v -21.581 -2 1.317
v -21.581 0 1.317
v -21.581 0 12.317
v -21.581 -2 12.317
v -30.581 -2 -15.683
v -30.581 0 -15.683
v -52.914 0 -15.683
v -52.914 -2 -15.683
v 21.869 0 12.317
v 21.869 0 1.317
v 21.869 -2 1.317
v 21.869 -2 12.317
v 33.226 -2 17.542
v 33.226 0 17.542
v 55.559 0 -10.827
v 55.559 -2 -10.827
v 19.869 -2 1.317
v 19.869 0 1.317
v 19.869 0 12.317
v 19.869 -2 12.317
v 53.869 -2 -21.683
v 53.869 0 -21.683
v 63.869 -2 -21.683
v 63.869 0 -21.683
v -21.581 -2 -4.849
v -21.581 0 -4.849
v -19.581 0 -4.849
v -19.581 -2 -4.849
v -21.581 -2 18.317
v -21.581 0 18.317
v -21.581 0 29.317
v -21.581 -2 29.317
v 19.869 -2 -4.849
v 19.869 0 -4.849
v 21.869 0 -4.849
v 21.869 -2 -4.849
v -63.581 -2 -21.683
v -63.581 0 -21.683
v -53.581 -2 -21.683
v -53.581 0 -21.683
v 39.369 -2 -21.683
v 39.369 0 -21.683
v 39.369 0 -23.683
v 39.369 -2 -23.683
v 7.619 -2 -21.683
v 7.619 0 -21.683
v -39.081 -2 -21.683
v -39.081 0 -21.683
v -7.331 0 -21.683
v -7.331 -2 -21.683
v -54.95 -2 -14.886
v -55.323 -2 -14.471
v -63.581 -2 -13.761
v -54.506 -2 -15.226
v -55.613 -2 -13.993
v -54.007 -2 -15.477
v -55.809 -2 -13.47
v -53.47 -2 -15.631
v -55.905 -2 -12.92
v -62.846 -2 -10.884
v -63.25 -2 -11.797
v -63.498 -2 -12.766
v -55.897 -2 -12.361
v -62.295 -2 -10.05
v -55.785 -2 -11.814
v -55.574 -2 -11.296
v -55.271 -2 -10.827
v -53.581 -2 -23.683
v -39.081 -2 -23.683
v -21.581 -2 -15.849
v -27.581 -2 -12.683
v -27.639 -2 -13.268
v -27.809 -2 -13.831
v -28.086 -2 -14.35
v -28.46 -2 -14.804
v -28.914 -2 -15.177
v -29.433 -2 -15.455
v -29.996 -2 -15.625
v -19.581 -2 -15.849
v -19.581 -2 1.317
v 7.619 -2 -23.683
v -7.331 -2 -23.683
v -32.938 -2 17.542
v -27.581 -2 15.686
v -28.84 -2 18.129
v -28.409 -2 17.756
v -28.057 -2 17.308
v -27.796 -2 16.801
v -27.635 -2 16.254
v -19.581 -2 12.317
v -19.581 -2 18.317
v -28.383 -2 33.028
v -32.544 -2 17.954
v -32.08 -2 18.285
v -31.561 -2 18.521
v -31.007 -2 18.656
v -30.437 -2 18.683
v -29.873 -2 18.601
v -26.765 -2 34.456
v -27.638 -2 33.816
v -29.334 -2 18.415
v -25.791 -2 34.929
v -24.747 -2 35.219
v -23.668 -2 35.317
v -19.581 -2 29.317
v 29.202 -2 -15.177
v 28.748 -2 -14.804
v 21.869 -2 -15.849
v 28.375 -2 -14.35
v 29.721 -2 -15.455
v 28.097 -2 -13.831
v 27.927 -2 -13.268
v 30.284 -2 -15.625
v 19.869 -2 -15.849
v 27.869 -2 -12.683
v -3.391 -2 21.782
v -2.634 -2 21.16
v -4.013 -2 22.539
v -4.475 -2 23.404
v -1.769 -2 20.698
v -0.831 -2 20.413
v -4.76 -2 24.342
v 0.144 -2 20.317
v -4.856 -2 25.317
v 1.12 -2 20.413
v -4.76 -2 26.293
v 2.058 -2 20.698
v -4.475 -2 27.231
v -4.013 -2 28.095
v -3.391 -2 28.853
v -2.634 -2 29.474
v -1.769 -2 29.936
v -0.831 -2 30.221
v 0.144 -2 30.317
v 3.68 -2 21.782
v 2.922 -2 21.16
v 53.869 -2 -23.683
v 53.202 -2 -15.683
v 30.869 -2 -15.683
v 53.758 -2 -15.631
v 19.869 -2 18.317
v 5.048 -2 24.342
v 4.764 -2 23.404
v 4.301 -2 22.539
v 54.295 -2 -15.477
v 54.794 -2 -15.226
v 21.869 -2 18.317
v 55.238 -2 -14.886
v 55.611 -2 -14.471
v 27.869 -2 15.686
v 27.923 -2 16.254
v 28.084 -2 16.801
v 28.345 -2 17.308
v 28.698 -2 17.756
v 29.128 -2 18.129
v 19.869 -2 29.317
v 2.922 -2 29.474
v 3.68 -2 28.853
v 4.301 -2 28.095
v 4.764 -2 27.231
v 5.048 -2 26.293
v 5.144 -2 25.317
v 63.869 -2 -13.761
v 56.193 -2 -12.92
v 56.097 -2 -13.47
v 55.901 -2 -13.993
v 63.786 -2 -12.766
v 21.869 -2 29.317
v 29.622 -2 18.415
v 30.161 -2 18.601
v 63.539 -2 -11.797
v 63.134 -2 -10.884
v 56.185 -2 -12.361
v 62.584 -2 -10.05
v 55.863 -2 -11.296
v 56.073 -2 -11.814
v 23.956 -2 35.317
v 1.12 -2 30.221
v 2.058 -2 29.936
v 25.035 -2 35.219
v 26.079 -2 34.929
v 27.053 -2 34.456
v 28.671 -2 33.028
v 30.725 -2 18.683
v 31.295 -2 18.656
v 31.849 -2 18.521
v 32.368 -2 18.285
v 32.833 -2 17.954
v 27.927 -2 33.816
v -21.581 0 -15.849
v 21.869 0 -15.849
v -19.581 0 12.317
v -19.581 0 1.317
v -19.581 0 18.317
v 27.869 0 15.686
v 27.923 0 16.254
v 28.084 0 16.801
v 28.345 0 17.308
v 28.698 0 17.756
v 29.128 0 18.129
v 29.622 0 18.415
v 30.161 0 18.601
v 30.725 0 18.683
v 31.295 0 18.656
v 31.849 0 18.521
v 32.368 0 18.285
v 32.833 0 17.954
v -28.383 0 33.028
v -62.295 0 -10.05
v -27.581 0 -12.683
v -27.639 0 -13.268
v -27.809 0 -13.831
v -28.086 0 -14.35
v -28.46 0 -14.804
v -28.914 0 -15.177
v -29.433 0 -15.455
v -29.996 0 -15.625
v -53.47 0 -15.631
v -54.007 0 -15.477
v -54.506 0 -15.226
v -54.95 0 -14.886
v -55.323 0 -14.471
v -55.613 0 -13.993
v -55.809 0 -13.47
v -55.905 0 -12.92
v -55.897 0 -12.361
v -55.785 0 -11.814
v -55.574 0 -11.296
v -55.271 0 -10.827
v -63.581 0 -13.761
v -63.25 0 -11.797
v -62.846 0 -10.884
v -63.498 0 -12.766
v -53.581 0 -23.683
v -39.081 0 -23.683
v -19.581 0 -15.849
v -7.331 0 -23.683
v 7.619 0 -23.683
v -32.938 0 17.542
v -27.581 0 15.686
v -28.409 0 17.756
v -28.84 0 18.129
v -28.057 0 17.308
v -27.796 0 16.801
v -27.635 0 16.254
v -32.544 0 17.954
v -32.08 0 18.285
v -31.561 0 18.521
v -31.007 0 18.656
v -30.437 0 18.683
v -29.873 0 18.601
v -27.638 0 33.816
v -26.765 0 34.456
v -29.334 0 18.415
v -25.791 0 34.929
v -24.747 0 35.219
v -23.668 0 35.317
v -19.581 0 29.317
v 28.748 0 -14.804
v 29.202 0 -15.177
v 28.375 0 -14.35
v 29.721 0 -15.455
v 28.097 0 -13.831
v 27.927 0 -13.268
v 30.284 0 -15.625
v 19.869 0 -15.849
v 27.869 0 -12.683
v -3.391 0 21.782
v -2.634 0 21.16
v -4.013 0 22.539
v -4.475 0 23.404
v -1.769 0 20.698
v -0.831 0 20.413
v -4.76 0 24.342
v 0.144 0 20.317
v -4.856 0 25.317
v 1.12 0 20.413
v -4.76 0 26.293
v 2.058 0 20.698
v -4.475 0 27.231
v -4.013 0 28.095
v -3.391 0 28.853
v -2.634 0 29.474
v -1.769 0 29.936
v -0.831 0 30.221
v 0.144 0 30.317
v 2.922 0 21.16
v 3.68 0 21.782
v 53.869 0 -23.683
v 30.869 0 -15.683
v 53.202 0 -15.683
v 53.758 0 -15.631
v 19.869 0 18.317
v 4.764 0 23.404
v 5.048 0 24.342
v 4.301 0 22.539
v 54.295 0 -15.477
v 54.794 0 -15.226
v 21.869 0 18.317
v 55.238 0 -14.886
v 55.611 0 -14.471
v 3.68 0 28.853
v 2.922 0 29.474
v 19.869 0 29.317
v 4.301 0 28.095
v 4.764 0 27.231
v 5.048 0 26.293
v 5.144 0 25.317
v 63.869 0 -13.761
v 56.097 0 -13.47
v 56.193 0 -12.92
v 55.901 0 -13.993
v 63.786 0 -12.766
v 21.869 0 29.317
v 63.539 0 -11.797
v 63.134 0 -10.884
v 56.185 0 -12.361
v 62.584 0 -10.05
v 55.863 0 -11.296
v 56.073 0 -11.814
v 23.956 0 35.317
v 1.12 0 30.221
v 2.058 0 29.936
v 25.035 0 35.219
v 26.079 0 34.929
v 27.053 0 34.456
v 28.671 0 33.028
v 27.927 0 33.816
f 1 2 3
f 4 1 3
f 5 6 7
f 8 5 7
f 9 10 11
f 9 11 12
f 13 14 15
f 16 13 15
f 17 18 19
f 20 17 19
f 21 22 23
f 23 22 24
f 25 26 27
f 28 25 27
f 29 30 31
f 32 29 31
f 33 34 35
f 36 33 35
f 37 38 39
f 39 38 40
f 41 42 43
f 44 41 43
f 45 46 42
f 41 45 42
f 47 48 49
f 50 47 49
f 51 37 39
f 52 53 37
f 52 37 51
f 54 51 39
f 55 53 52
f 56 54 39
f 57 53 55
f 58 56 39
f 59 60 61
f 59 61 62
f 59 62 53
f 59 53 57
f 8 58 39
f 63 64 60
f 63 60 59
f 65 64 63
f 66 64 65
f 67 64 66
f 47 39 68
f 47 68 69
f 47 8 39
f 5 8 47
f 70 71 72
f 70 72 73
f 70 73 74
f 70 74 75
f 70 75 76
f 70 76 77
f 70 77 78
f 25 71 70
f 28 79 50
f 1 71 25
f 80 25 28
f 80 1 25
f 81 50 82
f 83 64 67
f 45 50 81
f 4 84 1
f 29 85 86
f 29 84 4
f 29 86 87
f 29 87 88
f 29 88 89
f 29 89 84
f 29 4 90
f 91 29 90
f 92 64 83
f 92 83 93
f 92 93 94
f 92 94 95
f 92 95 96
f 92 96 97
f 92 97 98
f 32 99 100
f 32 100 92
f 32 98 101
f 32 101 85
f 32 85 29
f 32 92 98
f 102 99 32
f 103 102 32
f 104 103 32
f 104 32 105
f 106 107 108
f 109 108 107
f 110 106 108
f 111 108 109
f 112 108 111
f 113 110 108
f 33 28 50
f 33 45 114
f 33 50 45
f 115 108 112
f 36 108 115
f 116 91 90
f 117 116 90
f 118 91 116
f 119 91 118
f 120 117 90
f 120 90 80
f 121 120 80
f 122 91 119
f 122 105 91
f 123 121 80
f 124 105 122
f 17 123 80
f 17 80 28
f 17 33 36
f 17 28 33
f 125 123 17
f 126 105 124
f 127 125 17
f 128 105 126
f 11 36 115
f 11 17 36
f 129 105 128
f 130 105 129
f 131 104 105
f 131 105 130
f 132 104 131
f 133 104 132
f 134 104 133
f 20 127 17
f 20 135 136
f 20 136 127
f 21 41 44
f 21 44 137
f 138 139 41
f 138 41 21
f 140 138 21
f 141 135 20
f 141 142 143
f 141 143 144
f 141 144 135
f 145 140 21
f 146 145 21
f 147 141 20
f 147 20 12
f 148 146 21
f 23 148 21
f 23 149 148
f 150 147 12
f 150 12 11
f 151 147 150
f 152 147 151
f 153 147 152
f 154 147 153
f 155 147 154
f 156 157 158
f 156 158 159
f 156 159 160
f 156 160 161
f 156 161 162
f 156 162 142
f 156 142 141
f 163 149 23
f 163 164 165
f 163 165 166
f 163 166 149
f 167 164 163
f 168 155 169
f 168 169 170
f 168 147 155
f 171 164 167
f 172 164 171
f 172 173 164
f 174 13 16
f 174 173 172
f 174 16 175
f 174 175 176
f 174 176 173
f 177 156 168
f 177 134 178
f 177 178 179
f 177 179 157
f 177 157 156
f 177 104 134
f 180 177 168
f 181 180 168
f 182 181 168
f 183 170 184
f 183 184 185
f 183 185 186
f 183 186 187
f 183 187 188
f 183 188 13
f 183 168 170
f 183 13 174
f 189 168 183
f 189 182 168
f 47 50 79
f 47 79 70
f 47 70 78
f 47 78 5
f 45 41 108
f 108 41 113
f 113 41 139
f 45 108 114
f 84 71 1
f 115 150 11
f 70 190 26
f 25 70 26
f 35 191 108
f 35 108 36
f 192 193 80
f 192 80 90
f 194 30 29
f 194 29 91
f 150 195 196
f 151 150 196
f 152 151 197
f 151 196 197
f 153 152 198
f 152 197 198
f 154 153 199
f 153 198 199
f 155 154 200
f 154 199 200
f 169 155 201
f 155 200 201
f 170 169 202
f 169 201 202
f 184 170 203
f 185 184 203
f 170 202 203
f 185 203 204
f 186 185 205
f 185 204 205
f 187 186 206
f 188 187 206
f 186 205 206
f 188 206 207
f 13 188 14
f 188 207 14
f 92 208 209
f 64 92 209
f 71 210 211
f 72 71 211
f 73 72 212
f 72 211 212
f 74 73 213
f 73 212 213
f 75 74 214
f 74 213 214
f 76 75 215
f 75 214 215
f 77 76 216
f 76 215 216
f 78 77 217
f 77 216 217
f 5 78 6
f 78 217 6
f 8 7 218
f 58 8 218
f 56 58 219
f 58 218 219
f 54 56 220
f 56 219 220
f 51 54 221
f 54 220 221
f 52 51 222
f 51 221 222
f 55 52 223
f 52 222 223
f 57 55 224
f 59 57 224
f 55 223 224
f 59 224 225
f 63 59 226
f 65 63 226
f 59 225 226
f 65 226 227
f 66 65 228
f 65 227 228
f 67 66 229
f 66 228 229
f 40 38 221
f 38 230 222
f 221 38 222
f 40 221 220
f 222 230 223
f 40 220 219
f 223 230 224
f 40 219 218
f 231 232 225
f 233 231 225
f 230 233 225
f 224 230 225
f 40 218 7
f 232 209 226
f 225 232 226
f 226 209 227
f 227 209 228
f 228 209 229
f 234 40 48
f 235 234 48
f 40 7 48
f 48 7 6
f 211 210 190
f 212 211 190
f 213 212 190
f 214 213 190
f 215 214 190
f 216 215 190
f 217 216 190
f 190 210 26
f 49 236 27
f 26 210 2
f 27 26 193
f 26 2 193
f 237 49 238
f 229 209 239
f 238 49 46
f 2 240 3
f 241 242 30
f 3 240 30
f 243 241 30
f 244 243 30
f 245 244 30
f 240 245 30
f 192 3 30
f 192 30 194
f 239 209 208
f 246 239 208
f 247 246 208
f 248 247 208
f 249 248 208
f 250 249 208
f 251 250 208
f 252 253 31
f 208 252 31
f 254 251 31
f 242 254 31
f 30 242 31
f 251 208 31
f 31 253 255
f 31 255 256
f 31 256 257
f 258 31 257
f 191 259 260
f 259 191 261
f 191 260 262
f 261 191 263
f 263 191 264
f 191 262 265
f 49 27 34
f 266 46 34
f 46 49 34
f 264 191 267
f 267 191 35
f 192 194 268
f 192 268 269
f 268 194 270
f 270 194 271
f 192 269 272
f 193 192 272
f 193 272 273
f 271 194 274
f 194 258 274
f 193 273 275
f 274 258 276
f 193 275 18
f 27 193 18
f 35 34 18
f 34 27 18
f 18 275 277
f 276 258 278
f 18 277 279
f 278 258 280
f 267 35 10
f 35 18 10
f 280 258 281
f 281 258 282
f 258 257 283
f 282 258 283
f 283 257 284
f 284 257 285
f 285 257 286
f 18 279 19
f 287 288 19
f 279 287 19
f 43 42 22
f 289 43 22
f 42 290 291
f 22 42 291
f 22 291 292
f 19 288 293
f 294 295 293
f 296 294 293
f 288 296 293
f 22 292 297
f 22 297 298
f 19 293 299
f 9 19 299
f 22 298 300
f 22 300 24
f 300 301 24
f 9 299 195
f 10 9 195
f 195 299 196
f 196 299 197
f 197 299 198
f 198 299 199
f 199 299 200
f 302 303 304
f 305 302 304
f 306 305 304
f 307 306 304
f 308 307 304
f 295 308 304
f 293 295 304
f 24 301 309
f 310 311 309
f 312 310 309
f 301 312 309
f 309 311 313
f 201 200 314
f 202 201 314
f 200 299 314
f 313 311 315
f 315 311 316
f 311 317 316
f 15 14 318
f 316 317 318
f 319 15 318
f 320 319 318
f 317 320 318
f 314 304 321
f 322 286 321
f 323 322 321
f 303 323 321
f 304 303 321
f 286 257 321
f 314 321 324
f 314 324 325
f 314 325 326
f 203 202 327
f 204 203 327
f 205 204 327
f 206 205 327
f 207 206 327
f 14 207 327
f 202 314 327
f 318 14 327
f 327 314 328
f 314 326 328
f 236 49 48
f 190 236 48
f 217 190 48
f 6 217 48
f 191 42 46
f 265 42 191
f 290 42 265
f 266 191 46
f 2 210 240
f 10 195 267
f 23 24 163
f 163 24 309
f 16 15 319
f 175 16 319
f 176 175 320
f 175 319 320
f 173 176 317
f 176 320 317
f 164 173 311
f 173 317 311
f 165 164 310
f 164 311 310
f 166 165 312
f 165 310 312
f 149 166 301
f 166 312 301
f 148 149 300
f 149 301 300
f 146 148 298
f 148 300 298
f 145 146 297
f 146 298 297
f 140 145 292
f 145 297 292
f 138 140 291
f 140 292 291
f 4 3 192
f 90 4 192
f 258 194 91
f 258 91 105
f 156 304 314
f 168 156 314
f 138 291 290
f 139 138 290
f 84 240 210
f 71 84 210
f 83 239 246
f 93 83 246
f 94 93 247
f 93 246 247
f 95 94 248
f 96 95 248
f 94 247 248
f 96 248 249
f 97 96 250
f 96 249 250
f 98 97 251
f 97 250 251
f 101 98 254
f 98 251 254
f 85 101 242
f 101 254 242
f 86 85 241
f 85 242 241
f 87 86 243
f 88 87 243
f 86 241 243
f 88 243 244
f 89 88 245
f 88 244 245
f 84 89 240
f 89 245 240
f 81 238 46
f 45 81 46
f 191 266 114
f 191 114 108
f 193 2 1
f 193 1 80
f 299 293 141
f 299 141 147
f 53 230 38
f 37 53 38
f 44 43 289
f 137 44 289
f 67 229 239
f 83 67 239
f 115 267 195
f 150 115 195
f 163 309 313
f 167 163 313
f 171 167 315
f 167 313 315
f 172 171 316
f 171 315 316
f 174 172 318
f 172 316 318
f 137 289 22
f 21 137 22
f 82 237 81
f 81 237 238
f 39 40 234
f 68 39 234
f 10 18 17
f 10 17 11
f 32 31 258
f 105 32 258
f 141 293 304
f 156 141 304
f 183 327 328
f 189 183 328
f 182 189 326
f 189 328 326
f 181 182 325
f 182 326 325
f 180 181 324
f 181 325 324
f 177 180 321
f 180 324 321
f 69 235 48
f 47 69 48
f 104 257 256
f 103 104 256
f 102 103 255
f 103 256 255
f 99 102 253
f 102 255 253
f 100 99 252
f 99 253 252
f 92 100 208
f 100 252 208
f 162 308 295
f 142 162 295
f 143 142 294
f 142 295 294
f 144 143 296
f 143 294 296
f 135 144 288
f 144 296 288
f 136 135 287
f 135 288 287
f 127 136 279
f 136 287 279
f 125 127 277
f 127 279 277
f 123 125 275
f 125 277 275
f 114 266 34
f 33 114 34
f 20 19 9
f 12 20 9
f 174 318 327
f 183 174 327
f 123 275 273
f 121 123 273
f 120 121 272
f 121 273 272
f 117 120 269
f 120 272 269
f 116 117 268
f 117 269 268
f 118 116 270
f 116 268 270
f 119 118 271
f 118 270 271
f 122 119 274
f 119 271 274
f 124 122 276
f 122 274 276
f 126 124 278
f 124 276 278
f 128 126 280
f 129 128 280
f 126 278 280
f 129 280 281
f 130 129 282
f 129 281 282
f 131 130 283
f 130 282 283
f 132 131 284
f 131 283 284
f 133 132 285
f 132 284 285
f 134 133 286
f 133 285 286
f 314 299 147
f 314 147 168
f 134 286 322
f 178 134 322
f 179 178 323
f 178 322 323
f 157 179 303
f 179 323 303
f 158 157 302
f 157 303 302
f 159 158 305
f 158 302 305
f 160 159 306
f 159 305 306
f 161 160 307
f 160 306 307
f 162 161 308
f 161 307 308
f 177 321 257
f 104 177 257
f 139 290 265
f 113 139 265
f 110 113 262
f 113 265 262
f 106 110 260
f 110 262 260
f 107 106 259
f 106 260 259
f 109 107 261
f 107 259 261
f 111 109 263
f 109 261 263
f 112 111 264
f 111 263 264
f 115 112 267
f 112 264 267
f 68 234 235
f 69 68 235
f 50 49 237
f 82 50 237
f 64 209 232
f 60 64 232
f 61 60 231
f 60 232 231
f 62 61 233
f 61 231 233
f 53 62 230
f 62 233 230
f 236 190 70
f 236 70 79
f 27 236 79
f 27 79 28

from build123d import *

# Parameters (mm, degrees)
F0_W     = 2
F0_H     = 11
F1_DEPTH = 2


with BuildPart() as f1:
    # F0 (on Front) → F1 (new body)
    with BuildSketch(Plane.XZ):
        with BuildLine():
            Line((0.144111, 35.317095), (-19.580889, 35.317095))
            Line((-19.580889, 35.317095), (-21.580889, 35.317095))
            Line((-21.580889, 35.317095), (-23.668159, 35.317095))
            ThreePointArc((-23.668159, 35.317095), (-26.28845, 34.714694), (-28.382586, 33.028452))
            Line((-28.382586, 33.028452), (-62.295316, -10.04988))
            ThreePointArc((-62.295316, -10.04988), (-63.250393, -11.797385), (-63.580889, -13.761238))
            Line((-63.580889, -13.761238), (-63.580889, -21.682905))
            Line((-63.580889, -21.682905), (-53.580889, -21.682905))
            Line((-53.580889, -21.682905), (-53.580889, -23.682905))
            Line((-53.580889, -23.682905), (-39.080889, -23.682905))
            Line((-39.080889, -23.682905), (-39.080889, -21.682905))
            Line((-39.080889, -21.682905), (-21.580889, -21.682905))
            Line((-21.580889, -21.682905), (-7.330889, -21.682905))
            Line((-7.330889, -21.682905), (-7.330889, -21.849002))
            Line((-7.330889, -21.849002), (-7.330889, -23.682905))
            Line((-7.330889, -23.682905), (0.144111, -23.682905))
            Line((0.144111, -23.682905), (0.144111, 20.317095))
            ThreePointArc((0.144111, 20.317095), (-4.855889, 25.317095), (0.144111, 30.317095))
            Line((0.144111, 30.317095), (0.144111, 35.317095))
        make_face()
        with Locations((-20.580889, -10.349002)):
            Rectangle(F0_W, F0_H, mode=Mode.SUBTRACT)
        with BuildLine():
            Line((-30.580889, -15.682905), (-52.913921, -15.682905))
            ThreePointArc((-52.913921, -15.682905), (-55.612721, -13.993051), (-55.271135, -10.827226))
            Line((-55.271135, -10.827226), (-32.938102, 17.541761))
            ThreePointArc((-32.938102, 17.541761), (-29.598962, 18.520834), (-27.580889, 15.686082))
            Line((-27.580889, 15.686082), (-27.580889, -12.682905))
            ThreePointArc((-27.580889, -12.682905), (-28.459568, -14.804226), (-30.580889, -15.682905))
        make_face(mode=Mode.SUBTRACT)
        with Locations((-20.580889, 6.817095)):
            Rectangle(F0_W, F0_H, mode=Mode.SUBTRACT)
        with Locations((-20.580889, 23.817095)):
            Rectangle(F0_W, F0_H, mode=Mode.SUBTRACT)
        with BuildLine():
            Line((19.869111, 35.317095), (0.144111, 35.317095))
            Line((0.144111, 35.317095), (0.144111, 30.317095))
            ThreePointArc((0.144111, 30.317095), (3.679645, 28.852629), (5.144111, 25.317095))
            ThreePointArc((5.144111, 25.317095), (3.679645, 21.781561), (0.144111, 20.317095))
            Line((0.144111, 20.317095), (0.144111, -23.682905))
            Line((0.144111, -23.682905), (7.619111, -23.682905))
            Line((7.619111, -23.682905), (7.619111, -21.849002))
            Line((7.619111, -21.849002), (7.619111, -21.682905))
            Line((7.619111, -21.682905), (21.869111, -21.682905))
            Line((21.869111, -21.682905), (39.369111, -21.682905))
            Line((39.369111, -21.682905), (39.369111, -23.682905))
            Line((39.369111, -23.682905), (53.869111, -23.682905))
            Line((53.869111, -23.682905), (53.869111, -21.682905))
            Line((53.869111, -21.682905), (63.869111, -21.682905))
            Line((63.869111, -21.682905), (63.869111, -13.761238))
            ThreePointArc((63.869111, -13.761238), (63.538616, -11.797385), (62.583538, -10.04988))
            Line((62.583538, -10.04988), (28.670808, 33.028452))
            ThreePointArc((28.670808, 33.028452), (26.576673, 34.714694), (23.956381, 35.317095))
            Line((23.956381, 35.317095), (21.869111, 35.317095))
            Line((21.869111, 35.317095), (19.869111, 35.317095))
        make_face()
        with Locations((20.869111, -10.349002)):
            Rectangle(F0_W, F0_H, mode=Mode.SUBTRACT)
        with BuildLine():
            Line((53.202144, -15.682905), (30.869111, -15.682905))
            ThreePointArc((30.869111, -15.682905), (28.747791, -14.804226), (27.869111, -12.682905))
            Line((27.869111, -12.682905), (27.869111, 15.686082))
            ThreePointArc((27.869111, 15.686082), (29.887185, 18.520834), (33.226325, 17.541761))
            Line((33.226325, 17.541761), (55.559357, -10.827226))
            ThreePointArc((55.559357, -10.827226), (55.900943, -13.993051), (53.202144, -15.682905))
        make_face(mode=Mode.SUBTRACT)
        with Locations((20.869111, 6.817095)):
            Rectangle(F0_W, F0_H, mode=Mode.SUBTRACT)
        with Locations((20.869111, 23.817095)):
            Rectangle(F0_W, F0_H, mode=Mode.SUBTRACT)
    extrude(amount=F1_DEPTH)


solid = f1.part
